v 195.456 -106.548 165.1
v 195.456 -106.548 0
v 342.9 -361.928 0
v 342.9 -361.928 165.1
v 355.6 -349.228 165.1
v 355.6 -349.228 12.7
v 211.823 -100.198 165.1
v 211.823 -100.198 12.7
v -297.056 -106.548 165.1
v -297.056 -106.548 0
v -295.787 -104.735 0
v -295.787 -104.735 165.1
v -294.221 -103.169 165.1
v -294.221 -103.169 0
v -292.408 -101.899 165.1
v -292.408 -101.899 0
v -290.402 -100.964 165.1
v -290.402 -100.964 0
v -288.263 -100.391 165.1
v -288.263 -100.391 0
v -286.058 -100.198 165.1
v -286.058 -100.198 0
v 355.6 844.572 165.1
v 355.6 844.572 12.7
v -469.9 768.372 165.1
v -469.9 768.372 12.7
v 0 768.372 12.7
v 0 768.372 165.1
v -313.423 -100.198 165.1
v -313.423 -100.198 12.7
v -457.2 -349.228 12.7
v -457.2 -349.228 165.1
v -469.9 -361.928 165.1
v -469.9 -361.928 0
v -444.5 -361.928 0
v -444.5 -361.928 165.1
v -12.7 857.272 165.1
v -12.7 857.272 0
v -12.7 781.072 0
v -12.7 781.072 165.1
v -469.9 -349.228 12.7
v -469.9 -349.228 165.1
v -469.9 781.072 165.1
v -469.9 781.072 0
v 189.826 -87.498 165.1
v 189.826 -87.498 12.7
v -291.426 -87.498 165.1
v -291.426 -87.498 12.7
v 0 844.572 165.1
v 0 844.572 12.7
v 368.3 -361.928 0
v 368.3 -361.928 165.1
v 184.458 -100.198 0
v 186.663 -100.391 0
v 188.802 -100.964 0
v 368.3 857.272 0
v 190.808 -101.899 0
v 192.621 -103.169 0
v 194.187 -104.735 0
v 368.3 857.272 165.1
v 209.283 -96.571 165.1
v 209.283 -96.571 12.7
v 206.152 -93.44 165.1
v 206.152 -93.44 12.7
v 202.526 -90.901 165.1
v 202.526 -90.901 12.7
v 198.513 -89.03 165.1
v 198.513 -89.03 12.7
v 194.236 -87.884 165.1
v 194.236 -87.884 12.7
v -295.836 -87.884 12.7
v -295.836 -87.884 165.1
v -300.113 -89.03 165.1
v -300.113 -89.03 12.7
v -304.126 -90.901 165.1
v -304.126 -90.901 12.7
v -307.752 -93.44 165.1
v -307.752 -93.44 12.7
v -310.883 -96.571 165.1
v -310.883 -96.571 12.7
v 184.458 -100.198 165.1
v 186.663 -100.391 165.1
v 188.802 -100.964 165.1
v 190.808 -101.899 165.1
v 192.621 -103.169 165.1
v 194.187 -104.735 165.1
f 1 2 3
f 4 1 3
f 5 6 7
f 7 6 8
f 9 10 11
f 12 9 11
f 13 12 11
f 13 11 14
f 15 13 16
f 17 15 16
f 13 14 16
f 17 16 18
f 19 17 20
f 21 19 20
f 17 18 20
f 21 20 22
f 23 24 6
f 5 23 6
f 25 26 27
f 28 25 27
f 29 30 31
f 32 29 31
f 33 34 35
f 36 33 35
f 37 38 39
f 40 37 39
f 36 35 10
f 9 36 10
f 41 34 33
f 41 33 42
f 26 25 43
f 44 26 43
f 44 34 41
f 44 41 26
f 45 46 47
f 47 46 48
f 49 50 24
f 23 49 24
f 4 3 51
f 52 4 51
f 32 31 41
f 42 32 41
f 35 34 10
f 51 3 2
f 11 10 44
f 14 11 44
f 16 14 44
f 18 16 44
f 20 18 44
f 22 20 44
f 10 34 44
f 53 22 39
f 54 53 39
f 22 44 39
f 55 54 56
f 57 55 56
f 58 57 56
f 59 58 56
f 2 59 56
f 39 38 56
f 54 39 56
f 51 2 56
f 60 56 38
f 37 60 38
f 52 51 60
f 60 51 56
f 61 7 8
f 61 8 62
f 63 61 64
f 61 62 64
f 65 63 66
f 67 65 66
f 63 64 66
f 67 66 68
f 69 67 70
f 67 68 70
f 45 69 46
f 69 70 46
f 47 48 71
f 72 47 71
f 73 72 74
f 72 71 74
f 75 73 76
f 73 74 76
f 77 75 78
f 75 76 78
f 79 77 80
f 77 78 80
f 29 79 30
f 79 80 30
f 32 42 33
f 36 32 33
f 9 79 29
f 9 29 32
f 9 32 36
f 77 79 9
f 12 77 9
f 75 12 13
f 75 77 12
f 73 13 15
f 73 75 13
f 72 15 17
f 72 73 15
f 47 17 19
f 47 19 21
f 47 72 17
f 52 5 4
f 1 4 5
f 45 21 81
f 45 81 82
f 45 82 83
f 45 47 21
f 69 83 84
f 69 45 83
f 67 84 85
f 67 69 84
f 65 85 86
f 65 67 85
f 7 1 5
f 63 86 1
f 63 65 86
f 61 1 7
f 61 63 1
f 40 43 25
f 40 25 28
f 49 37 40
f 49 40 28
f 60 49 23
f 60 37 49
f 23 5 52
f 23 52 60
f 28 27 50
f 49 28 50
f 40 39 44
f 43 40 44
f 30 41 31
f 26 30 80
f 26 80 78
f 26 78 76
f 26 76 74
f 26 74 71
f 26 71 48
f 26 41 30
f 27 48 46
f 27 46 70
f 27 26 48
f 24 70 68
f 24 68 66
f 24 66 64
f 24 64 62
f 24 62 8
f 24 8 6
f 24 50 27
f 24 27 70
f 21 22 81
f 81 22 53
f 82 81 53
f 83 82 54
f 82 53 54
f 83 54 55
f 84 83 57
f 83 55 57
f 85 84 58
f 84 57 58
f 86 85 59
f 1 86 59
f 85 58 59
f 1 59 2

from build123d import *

# Parameters (mm, degrees)
F1_DEPTH = 165.1
F2_DEPTH = 12.7
F0_W     = 12.7
F0_H     = 1117.6
F3_DEPTH = 12.7


with BuildPart() as f1:
    # F0 (on Top) → F1 (new body)
    with BuildSketch(Plane.XY):
        with BuildLine():
            Line((342.9, -361.927737), (368.3, -361.927737))
            Line((368.3, -361.927737), (368.3, 857.272263))
            Line((368.3, 857.272263), (-12.7, 857.272263))
            Line((-12.7, 857.272263), (-12.7, 781.072263))
            Line((-12.7, 781.072263), (-469.9, 781.072263))
            Line((-469.9, 781.072263), (-469.9, 768.372263))
            Line((-469.9, 768.372263), (-457.2, 768.372263))
            Line((-457.2, 768.372263), (0, 768.372263))
            Line((0, 768.372263), (0, 819.172263))
            Line((0, 819.172263), (0, 844.572263))
            Line((0, 844.572263), (355.6, 844.572263))
            Line((355.6, 844.572263), (355.6, -349.227737))
            Line((355.6, -349.227737), (211.822605, -100.197983))
            ThreePointArc((211.822605, -100.197983), (202.52556, -90.900938), (189.82556, -87.497983))
            Line((189.82556, -87.497983), (-291.42556, -87.497983))
            ThreePointArc((-291.42556, -87.497983), (-304.12556, -90.900938), (-313.422605, -100.197983))
            Line((-313.422605, -100.197983), (-457.2, -349.227737))
            Line((-457.2, -349.227737), (-469.9, -349.227737))
            Line((-469.9, -349.227737), (-469.9, -361.927737))
            Line((-469.9, -361.927737), (-444.5, -361.927737))
            Line((-444.5, -361.927737), (-297.056431, -106.547983))
            ThreePointArc((-297.056431, -106.547983), (-292.407908, -101.899461), (-286.057908, -100.197983))
            Line((-286.057908, -100.197983), (184.457908, -100.197983))
            ThreePointArc((184.457908, -100.197983), (190.807908, -101.899461), (195.456431, -106.547983))
            Line((195.456431, -106.547983), (342.9, -361.927737))
        make_face()
    extrude(amount=F1_DEPTH)

    # F0 (on Top) → F2 (join)
    with BuildSketch(Plane.XY):
        with BuildLine():
            Line((0, 768.372263), (-457.2, 768.372263))
            Line((-457.2, 768.372263), (-457.2, -349.227737))
            Line((-457.2, -349.227737), (-313.422605, -100.197983))
            ThreePointArc((-313.422605, -100.197983), (-304.12556, -90.900938), (-291.42556, -87.497983))
            Line((-291.42556, -87.497983), (189.82556, -87.497983))
            ThreePointArc((189.82556, -87.497983), (202.52556, -90.900938), (211.822605, -100.197983))
            Line((211.822605, -100.197983), (355.6, -349.227737))
            Line((355.6, -349.227737), (355.6, 844.572263))
            Line((355.6, 844.572263), (0, 844.572263))
            Line((0, 844.572263), (0, 819.172263))
            Line((0, 819.172263), (0, 768.372263))
        make_face()
    extrude(amount=F2_DEPTH)

    # F0 (on Top) → F3 (join)
    with BuildSketch(Plane.XY):
        with Locations((-463.55, 209.572263)):
            Rectangle(F0_W, F0_H)
    extrude(amount=F3_DEPTH)


solid = f1.part
